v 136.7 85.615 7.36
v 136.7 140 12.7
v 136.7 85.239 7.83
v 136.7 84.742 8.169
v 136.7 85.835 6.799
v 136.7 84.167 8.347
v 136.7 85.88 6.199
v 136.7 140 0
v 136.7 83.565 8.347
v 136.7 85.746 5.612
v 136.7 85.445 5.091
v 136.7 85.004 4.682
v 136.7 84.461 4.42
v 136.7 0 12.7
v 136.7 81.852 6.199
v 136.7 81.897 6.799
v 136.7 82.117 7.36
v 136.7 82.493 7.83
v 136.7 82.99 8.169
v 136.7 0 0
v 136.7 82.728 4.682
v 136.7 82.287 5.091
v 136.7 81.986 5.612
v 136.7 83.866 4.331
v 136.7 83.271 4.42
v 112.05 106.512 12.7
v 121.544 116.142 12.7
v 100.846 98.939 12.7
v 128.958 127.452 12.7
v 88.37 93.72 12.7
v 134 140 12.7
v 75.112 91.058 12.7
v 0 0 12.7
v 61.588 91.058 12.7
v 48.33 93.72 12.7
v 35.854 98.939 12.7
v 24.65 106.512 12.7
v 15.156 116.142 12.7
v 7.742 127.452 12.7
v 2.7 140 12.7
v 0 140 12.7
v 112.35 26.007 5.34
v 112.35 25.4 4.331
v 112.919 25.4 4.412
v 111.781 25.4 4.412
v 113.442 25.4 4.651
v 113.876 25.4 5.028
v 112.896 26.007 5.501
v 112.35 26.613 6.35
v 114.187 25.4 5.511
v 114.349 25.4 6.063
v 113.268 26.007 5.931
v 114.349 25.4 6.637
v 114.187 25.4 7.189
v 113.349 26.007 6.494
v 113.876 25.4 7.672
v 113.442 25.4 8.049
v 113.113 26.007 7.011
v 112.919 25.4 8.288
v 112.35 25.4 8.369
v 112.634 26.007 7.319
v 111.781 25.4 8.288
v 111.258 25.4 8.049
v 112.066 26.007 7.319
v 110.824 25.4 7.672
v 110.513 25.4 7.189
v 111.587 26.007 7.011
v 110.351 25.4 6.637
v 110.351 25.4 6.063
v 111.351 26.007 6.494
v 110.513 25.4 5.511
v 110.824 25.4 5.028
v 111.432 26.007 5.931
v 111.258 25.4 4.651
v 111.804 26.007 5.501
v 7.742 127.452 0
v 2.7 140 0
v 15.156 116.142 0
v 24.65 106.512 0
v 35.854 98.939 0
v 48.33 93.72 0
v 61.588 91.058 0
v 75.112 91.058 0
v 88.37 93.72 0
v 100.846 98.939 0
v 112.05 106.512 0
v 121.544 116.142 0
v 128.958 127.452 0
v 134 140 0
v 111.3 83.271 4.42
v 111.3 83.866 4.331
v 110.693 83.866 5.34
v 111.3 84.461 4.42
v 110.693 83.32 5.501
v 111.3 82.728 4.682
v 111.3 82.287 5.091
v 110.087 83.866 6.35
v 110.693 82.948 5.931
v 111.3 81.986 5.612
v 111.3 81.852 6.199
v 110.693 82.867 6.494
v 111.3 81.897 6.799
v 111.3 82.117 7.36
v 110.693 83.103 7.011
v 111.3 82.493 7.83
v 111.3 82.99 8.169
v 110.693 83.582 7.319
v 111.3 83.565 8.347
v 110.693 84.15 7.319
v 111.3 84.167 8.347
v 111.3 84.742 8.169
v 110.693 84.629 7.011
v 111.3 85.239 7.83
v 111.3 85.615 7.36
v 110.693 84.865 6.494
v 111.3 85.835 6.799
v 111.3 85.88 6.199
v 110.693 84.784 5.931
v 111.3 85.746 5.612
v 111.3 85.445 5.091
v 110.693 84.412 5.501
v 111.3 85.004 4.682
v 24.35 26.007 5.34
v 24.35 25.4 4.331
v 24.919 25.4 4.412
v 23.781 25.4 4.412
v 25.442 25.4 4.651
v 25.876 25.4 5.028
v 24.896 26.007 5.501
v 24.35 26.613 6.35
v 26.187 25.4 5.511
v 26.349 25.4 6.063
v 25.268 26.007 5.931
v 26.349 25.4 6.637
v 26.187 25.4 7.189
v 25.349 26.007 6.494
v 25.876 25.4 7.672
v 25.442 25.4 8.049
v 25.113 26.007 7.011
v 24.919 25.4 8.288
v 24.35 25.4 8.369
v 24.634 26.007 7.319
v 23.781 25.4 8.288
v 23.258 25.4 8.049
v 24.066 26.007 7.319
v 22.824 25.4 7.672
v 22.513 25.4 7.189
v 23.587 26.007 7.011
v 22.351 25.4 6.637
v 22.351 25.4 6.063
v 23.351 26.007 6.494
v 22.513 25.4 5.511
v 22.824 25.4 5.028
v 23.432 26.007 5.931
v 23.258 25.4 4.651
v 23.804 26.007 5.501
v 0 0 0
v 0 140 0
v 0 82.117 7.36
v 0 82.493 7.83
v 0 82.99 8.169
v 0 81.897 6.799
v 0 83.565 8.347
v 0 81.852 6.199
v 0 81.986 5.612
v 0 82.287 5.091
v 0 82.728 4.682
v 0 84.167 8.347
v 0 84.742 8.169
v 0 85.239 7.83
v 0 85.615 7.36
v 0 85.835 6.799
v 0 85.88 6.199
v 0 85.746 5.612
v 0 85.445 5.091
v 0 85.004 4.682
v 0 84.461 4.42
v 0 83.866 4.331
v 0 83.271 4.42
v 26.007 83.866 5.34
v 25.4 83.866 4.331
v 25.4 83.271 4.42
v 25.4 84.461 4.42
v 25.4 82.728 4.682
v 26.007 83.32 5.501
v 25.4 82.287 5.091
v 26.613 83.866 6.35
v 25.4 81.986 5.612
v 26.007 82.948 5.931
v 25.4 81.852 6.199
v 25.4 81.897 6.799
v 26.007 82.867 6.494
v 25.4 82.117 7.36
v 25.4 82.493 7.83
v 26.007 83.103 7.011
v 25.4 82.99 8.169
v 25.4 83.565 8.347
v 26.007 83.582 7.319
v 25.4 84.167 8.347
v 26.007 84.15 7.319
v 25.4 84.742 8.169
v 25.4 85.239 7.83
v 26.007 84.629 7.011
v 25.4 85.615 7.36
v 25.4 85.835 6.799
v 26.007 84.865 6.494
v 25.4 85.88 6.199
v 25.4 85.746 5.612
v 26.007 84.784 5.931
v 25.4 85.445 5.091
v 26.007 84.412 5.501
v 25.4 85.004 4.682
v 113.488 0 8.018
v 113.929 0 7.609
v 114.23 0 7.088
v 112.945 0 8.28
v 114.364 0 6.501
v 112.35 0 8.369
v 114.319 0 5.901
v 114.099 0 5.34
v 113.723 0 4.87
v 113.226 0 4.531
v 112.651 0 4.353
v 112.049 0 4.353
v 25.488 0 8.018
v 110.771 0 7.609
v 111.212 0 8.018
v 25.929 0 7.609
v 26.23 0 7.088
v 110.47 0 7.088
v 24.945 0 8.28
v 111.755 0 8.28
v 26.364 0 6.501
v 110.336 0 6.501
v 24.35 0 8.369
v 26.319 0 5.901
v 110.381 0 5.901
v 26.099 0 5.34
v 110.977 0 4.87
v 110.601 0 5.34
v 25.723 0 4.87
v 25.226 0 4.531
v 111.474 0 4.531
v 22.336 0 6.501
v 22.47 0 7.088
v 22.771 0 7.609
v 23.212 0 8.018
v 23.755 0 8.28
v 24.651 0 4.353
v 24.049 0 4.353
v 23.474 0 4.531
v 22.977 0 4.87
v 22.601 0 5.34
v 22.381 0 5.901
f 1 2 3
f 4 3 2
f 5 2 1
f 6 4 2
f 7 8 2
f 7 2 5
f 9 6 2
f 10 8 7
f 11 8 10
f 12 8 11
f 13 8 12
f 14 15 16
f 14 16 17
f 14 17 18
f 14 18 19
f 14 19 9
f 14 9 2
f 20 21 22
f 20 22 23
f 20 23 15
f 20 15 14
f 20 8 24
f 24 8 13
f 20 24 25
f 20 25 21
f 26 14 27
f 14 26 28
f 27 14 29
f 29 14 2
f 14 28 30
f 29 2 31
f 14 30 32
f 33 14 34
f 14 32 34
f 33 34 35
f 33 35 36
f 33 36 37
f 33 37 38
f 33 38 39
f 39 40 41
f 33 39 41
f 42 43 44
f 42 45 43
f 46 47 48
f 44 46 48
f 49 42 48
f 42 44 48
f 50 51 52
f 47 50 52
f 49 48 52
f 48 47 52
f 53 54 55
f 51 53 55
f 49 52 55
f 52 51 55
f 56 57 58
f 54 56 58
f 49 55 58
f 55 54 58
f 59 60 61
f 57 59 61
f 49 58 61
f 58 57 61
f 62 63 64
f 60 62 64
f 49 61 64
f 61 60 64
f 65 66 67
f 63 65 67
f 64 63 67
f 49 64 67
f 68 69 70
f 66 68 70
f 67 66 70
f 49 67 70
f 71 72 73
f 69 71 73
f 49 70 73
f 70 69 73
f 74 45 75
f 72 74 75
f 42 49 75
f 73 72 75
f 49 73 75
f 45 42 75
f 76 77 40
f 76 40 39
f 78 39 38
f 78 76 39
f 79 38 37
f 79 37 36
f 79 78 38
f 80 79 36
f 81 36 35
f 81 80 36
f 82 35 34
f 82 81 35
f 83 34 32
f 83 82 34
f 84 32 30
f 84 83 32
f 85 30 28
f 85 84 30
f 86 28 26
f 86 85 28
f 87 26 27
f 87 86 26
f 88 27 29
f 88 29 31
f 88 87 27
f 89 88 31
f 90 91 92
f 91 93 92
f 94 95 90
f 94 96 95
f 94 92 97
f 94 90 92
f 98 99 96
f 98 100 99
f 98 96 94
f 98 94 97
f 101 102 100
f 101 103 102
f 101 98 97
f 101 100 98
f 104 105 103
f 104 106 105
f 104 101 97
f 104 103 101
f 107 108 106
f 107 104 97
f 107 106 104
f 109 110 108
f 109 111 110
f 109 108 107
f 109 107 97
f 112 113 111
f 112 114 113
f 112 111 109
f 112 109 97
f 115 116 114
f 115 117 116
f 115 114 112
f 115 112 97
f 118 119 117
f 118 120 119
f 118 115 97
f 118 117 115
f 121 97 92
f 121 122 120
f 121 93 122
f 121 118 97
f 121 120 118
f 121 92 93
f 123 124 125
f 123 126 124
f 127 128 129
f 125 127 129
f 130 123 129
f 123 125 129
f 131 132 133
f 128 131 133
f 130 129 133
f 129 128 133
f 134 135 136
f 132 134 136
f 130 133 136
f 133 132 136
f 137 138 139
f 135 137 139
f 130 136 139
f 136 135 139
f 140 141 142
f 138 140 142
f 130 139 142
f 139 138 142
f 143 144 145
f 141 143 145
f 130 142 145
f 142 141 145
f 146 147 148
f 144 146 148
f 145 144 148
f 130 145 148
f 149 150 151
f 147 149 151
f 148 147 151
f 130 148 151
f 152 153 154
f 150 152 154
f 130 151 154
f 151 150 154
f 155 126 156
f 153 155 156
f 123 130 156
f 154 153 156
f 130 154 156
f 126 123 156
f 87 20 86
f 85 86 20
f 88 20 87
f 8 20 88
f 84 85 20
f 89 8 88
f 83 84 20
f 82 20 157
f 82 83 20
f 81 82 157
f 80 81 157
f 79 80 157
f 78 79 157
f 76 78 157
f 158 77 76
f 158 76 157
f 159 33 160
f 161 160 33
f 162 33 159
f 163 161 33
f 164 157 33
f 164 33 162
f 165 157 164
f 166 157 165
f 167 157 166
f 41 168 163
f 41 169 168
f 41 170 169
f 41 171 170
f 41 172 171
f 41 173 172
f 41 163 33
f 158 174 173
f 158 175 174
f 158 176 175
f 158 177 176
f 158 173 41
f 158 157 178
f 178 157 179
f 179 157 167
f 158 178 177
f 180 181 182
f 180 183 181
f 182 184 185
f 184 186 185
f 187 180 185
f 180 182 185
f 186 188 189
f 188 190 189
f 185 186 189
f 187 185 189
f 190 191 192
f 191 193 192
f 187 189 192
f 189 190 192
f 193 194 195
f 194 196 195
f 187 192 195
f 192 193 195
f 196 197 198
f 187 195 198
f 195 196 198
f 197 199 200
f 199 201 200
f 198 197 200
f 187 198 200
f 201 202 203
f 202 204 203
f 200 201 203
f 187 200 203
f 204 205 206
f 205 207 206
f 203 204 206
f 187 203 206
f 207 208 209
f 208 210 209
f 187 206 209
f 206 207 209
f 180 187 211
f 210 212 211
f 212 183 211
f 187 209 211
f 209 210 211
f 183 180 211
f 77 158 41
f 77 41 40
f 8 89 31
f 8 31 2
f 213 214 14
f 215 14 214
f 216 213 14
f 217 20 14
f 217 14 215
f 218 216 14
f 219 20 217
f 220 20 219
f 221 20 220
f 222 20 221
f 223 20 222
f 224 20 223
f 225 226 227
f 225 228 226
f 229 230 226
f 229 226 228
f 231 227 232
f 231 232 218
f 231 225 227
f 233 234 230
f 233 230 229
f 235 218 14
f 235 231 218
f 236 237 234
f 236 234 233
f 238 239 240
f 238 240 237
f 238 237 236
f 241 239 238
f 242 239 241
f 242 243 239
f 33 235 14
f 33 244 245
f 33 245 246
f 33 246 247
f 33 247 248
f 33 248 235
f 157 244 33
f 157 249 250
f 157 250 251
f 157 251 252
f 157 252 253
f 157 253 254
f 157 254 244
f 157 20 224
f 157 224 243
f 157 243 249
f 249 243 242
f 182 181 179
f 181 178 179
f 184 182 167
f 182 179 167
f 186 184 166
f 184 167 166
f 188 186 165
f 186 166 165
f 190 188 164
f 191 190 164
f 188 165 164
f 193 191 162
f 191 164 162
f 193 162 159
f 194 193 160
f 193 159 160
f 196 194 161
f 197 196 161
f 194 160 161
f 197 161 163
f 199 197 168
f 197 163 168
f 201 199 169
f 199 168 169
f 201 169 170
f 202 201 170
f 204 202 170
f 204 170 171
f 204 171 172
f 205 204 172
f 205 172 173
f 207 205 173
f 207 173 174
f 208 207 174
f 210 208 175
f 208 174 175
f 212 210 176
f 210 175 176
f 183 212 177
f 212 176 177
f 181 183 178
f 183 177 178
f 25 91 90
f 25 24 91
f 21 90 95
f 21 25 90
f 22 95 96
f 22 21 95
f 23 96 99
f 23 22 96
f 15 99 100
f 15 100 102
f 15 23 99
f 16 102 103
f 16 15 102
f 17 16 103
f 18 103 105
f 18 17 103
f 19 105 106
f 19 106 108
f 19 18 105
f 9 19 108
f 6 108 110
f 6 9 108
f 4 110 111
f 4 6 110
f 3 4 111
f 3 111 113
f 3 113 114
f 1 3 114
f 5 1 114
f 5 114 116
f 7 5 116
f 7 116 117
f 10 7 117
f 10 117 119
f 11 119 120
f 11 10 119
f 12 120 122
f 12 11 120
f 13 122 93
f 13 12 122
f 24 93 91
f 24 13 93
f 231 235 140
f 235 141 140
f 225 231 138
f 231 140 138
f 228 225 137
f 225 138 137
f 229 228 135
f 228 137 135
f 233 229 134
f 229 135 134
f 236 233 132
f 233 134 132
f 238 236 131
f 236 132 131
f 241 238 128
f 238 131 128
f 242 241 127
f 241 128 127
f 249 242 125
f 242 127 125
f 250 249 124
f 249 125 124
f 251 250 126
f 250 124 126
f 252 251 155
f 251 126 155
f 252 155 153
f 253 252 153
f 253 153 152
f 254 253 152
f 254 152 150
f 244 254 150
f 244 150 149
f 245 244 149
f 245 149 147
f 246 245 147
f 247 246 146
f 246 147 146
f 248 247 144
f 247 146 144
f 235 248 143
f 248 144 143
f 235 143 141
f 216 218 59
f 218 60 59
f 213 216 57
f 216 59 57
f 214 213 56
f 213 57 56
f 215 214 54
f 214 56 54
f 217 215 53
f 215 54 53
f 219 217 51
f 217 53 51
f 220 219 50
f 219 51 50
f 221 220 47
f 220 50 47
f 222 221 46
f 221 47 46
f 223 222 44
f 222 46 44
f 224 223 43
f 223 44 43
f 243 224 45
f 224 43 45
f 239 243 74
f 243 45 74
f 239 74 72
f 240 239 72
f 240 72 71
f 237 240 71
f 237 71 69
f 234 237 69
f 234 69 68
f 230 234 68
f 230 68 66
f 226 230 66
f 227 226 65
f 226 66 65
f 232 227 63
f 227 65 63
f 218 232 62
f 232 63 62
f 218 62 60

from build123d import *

# Parameters (mm, degrees)
BOSS_EXTRUDE1_DEPTH        = 12.7
F_10_32_TAPPED_HOLE2_D     = 4.0386
F_10_32_TAPPED_HOLE2_DEPTH = 25.4
F_10_32_TAPPED_HOLE2_TIP   = 1.213317848


with BuildPart() as part:
    # Sketch1 → Boss-Extrude1 (new body)
    with BuildSketch(Plane.XY):
        with BuildLine():
            Line((0, 0), (0, 140))
            Line((0, 140), (2.7, 140))
            ThreePointArc((2.7, 140), (68.35, 90.722783973), (134, 140))
            Line((134, 140), (136.7, 140))
            Line((136.7, 140), (136.7, 0))
            Line((136.7, 0), (0, 0))
        make_face()
    extrude(amount=BOSS_EXTRUDE1_DEPTH)

    # Sketch3 → #10-32 Tapped Hole1 (revolve, cut)
    with BuildSketch(Plane(origin=(136.7, 83.866, 6.35), x_dir=(0, 0, -1), z_dir=(0, 1, 0))):
        Polygon((0, 0), (0, 26.613317848), (2.0193, 25.4), (2.0193, 0), align=None)
    f_10_32_tapped_hole1 = revolve(axis=Axis((143.05, 83.866, 6.35), (-1, 0, 0)), mode=Mode.SUBTRACT)

    # Mirror3: #10-32 Tapped Hole1 across plane
    add(f_10_32_tapped_hole1.mirror(Plane(origin=(68.35, 0, 0), x_dir=(0, 0, 1), z_dir=(1, 0, 0))), mode=Mode.SUBTRACT)

    # #10-32 Tapped Hole2
    with Locations(Plane(origin=(112.35, 0, 6.35), x_dir=(0, 0, -1), z_dir=(0, -1, 0))):
        with Locations((0, 0), (0, -88)):
            Hole(F_10_32_TAPPED_HOLE2_D / 2, depth=F_10_32_TAPPED_HOLE2_DEPTH)
            with Locations((0, 0, -(F_10_32_TAPPED_HOLE2_DEPTH + F_10_32_TAPPED_HOLE2_TIP / 2))):  # 118° drill point
                Cone(0, F_10_32_TAPPED_HOLE2_D / 2, F_10_32_TAPPED_HOLE2_TIP, mode=Mode.SUBTRACT)


solid = part.part
